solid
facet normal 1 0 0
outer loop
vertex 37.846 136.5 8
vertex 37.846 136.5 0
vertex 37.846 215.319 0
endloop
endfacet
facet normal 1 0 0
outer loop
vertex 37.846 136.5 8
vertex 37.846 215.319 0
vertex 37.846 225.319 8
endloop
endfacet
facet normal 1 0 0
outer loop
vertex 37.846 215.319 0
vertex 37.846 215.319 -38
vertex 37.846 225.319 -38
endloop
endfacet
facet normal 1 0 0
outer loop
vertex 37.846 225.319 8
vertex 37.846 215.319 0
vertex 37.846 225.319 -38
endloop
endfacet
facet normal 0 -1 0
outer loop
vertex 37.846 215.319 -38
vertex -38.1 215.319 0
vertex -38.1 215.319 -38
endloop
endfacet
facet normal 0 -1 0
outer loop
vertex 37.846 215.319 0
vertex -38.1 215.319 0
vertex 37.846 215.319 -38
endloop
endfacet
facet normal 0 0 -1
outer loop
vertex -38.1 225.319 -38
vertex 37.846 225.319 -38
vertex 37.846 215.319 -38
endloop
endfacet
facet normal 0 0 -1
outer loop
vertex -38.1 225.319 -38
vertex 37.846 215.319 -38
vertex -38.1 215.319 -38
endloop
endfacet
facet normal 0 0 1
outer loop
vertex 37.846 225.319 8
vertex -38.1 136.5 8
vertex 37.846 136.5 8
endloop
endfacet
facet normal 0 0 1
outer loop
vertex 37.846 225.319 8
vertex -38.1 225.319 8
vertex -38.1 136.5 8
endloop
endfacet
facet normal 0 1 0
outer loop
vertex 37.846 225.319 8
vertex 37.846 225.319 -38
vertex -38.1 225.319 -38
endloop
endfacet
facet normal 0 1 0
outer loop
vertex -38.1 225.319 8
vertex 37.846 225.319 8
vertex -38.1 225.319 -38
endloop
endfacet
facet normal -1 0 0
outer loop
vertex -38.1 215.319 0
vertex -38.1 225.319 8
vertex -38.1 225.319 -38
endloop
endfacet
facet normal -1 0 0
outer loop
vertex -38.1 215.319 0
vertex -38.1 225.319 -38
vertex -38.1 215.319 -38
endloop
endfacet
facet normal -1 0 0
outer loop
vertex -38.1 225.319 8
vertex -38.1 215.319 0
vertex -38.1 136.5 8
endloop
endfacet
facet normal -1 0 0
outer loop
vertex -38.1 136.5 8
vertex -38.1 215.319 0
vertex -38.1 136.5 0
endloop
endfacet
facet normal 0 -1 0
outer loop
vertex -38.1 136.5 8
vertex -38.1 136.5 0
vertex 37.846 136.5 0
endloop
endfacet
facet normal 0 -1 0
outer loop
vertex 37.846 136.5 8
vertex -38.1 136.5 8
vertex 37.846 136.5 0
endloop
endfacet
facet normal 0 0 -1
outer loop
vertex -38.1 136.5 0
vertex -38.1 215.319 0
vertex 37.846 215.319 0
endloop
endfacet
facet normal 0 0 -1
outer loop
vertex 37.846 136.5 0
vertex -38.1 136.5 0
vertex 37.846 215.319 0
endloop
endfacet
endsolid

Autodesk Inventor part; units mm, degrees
ref_plane "YZ Plane" through (0, 0, 0) normal (1, 0, 0) x (0, 1, 0)
ref_plane "XZ Plane" through (0, 0, 0) normal (0, 1, 0) x (-1, 0, 0)
ref_plane "XY Plane" through (0, 0, 0) normal (0, 0, 1) x (1, 0, 0)
sketch "Sketch1" plane through (0, 0, 0) normal (0, 0, 1) x (1, 0, 0)
  line L0 (20.828, 60.2998) -> (-20.828, 60.2998) construction
  line L1 (-38.1, 60.2998) -> (-38.1, 136.4998) construction
  line L2 (-38.1, 136.4998) -> (-20.828, 136.4998) construction
  line L3 (38.1, 136.4998) -> (-38.1, 136.4998) construction
  line L4 (37.846, 60.2998) -> (37.846, 136.4998) construction
  line L5 (-20.828, 47.6808) -> (-38.1, 47.6808) construction
  line L6 (-38.1, 136.4998) -> (37.846, 136.4998)
  line L7 (37.846, 136.4998) -> (37.846, 225.3188)
  line L8 (37.846, 225.3188) -> (-38.1, 225.3188)
  line L9 (-38.1, 225.3188) -> (-38.1, 136.4998)
  point P0 (0, 0)
extrude "Extrusion1" add sketch "Sketch1" along normal blind 8
sketch "Sketch2" plane through (0, 0, 0) normal (0, 0, -1) x (-1, 0, 0)
  line L0 (-37.846, 136.4998) -> (-37.846, 225.3188) projected
  line L1 (38.1, 225.3188) -> (38.1, 136.4998) projected
  line L2 (-37.846, 225.3188) -> (38.1, 225.3188)
  line L3 (38.1, 225.3188) -> (38.1, 215.3188)
  line L4 (38.1, 215.3188) -> (-37.846, 215.3188)
  line L5 (-37.846, 215.3188) -> (-37.846, 225.3188)
  point P0 (0, 0)
  dimension "d2" = 10
extrude "Extrusion2" add sketch "Sketch2" along normal blind 38
properties part number "MountingBracket"
